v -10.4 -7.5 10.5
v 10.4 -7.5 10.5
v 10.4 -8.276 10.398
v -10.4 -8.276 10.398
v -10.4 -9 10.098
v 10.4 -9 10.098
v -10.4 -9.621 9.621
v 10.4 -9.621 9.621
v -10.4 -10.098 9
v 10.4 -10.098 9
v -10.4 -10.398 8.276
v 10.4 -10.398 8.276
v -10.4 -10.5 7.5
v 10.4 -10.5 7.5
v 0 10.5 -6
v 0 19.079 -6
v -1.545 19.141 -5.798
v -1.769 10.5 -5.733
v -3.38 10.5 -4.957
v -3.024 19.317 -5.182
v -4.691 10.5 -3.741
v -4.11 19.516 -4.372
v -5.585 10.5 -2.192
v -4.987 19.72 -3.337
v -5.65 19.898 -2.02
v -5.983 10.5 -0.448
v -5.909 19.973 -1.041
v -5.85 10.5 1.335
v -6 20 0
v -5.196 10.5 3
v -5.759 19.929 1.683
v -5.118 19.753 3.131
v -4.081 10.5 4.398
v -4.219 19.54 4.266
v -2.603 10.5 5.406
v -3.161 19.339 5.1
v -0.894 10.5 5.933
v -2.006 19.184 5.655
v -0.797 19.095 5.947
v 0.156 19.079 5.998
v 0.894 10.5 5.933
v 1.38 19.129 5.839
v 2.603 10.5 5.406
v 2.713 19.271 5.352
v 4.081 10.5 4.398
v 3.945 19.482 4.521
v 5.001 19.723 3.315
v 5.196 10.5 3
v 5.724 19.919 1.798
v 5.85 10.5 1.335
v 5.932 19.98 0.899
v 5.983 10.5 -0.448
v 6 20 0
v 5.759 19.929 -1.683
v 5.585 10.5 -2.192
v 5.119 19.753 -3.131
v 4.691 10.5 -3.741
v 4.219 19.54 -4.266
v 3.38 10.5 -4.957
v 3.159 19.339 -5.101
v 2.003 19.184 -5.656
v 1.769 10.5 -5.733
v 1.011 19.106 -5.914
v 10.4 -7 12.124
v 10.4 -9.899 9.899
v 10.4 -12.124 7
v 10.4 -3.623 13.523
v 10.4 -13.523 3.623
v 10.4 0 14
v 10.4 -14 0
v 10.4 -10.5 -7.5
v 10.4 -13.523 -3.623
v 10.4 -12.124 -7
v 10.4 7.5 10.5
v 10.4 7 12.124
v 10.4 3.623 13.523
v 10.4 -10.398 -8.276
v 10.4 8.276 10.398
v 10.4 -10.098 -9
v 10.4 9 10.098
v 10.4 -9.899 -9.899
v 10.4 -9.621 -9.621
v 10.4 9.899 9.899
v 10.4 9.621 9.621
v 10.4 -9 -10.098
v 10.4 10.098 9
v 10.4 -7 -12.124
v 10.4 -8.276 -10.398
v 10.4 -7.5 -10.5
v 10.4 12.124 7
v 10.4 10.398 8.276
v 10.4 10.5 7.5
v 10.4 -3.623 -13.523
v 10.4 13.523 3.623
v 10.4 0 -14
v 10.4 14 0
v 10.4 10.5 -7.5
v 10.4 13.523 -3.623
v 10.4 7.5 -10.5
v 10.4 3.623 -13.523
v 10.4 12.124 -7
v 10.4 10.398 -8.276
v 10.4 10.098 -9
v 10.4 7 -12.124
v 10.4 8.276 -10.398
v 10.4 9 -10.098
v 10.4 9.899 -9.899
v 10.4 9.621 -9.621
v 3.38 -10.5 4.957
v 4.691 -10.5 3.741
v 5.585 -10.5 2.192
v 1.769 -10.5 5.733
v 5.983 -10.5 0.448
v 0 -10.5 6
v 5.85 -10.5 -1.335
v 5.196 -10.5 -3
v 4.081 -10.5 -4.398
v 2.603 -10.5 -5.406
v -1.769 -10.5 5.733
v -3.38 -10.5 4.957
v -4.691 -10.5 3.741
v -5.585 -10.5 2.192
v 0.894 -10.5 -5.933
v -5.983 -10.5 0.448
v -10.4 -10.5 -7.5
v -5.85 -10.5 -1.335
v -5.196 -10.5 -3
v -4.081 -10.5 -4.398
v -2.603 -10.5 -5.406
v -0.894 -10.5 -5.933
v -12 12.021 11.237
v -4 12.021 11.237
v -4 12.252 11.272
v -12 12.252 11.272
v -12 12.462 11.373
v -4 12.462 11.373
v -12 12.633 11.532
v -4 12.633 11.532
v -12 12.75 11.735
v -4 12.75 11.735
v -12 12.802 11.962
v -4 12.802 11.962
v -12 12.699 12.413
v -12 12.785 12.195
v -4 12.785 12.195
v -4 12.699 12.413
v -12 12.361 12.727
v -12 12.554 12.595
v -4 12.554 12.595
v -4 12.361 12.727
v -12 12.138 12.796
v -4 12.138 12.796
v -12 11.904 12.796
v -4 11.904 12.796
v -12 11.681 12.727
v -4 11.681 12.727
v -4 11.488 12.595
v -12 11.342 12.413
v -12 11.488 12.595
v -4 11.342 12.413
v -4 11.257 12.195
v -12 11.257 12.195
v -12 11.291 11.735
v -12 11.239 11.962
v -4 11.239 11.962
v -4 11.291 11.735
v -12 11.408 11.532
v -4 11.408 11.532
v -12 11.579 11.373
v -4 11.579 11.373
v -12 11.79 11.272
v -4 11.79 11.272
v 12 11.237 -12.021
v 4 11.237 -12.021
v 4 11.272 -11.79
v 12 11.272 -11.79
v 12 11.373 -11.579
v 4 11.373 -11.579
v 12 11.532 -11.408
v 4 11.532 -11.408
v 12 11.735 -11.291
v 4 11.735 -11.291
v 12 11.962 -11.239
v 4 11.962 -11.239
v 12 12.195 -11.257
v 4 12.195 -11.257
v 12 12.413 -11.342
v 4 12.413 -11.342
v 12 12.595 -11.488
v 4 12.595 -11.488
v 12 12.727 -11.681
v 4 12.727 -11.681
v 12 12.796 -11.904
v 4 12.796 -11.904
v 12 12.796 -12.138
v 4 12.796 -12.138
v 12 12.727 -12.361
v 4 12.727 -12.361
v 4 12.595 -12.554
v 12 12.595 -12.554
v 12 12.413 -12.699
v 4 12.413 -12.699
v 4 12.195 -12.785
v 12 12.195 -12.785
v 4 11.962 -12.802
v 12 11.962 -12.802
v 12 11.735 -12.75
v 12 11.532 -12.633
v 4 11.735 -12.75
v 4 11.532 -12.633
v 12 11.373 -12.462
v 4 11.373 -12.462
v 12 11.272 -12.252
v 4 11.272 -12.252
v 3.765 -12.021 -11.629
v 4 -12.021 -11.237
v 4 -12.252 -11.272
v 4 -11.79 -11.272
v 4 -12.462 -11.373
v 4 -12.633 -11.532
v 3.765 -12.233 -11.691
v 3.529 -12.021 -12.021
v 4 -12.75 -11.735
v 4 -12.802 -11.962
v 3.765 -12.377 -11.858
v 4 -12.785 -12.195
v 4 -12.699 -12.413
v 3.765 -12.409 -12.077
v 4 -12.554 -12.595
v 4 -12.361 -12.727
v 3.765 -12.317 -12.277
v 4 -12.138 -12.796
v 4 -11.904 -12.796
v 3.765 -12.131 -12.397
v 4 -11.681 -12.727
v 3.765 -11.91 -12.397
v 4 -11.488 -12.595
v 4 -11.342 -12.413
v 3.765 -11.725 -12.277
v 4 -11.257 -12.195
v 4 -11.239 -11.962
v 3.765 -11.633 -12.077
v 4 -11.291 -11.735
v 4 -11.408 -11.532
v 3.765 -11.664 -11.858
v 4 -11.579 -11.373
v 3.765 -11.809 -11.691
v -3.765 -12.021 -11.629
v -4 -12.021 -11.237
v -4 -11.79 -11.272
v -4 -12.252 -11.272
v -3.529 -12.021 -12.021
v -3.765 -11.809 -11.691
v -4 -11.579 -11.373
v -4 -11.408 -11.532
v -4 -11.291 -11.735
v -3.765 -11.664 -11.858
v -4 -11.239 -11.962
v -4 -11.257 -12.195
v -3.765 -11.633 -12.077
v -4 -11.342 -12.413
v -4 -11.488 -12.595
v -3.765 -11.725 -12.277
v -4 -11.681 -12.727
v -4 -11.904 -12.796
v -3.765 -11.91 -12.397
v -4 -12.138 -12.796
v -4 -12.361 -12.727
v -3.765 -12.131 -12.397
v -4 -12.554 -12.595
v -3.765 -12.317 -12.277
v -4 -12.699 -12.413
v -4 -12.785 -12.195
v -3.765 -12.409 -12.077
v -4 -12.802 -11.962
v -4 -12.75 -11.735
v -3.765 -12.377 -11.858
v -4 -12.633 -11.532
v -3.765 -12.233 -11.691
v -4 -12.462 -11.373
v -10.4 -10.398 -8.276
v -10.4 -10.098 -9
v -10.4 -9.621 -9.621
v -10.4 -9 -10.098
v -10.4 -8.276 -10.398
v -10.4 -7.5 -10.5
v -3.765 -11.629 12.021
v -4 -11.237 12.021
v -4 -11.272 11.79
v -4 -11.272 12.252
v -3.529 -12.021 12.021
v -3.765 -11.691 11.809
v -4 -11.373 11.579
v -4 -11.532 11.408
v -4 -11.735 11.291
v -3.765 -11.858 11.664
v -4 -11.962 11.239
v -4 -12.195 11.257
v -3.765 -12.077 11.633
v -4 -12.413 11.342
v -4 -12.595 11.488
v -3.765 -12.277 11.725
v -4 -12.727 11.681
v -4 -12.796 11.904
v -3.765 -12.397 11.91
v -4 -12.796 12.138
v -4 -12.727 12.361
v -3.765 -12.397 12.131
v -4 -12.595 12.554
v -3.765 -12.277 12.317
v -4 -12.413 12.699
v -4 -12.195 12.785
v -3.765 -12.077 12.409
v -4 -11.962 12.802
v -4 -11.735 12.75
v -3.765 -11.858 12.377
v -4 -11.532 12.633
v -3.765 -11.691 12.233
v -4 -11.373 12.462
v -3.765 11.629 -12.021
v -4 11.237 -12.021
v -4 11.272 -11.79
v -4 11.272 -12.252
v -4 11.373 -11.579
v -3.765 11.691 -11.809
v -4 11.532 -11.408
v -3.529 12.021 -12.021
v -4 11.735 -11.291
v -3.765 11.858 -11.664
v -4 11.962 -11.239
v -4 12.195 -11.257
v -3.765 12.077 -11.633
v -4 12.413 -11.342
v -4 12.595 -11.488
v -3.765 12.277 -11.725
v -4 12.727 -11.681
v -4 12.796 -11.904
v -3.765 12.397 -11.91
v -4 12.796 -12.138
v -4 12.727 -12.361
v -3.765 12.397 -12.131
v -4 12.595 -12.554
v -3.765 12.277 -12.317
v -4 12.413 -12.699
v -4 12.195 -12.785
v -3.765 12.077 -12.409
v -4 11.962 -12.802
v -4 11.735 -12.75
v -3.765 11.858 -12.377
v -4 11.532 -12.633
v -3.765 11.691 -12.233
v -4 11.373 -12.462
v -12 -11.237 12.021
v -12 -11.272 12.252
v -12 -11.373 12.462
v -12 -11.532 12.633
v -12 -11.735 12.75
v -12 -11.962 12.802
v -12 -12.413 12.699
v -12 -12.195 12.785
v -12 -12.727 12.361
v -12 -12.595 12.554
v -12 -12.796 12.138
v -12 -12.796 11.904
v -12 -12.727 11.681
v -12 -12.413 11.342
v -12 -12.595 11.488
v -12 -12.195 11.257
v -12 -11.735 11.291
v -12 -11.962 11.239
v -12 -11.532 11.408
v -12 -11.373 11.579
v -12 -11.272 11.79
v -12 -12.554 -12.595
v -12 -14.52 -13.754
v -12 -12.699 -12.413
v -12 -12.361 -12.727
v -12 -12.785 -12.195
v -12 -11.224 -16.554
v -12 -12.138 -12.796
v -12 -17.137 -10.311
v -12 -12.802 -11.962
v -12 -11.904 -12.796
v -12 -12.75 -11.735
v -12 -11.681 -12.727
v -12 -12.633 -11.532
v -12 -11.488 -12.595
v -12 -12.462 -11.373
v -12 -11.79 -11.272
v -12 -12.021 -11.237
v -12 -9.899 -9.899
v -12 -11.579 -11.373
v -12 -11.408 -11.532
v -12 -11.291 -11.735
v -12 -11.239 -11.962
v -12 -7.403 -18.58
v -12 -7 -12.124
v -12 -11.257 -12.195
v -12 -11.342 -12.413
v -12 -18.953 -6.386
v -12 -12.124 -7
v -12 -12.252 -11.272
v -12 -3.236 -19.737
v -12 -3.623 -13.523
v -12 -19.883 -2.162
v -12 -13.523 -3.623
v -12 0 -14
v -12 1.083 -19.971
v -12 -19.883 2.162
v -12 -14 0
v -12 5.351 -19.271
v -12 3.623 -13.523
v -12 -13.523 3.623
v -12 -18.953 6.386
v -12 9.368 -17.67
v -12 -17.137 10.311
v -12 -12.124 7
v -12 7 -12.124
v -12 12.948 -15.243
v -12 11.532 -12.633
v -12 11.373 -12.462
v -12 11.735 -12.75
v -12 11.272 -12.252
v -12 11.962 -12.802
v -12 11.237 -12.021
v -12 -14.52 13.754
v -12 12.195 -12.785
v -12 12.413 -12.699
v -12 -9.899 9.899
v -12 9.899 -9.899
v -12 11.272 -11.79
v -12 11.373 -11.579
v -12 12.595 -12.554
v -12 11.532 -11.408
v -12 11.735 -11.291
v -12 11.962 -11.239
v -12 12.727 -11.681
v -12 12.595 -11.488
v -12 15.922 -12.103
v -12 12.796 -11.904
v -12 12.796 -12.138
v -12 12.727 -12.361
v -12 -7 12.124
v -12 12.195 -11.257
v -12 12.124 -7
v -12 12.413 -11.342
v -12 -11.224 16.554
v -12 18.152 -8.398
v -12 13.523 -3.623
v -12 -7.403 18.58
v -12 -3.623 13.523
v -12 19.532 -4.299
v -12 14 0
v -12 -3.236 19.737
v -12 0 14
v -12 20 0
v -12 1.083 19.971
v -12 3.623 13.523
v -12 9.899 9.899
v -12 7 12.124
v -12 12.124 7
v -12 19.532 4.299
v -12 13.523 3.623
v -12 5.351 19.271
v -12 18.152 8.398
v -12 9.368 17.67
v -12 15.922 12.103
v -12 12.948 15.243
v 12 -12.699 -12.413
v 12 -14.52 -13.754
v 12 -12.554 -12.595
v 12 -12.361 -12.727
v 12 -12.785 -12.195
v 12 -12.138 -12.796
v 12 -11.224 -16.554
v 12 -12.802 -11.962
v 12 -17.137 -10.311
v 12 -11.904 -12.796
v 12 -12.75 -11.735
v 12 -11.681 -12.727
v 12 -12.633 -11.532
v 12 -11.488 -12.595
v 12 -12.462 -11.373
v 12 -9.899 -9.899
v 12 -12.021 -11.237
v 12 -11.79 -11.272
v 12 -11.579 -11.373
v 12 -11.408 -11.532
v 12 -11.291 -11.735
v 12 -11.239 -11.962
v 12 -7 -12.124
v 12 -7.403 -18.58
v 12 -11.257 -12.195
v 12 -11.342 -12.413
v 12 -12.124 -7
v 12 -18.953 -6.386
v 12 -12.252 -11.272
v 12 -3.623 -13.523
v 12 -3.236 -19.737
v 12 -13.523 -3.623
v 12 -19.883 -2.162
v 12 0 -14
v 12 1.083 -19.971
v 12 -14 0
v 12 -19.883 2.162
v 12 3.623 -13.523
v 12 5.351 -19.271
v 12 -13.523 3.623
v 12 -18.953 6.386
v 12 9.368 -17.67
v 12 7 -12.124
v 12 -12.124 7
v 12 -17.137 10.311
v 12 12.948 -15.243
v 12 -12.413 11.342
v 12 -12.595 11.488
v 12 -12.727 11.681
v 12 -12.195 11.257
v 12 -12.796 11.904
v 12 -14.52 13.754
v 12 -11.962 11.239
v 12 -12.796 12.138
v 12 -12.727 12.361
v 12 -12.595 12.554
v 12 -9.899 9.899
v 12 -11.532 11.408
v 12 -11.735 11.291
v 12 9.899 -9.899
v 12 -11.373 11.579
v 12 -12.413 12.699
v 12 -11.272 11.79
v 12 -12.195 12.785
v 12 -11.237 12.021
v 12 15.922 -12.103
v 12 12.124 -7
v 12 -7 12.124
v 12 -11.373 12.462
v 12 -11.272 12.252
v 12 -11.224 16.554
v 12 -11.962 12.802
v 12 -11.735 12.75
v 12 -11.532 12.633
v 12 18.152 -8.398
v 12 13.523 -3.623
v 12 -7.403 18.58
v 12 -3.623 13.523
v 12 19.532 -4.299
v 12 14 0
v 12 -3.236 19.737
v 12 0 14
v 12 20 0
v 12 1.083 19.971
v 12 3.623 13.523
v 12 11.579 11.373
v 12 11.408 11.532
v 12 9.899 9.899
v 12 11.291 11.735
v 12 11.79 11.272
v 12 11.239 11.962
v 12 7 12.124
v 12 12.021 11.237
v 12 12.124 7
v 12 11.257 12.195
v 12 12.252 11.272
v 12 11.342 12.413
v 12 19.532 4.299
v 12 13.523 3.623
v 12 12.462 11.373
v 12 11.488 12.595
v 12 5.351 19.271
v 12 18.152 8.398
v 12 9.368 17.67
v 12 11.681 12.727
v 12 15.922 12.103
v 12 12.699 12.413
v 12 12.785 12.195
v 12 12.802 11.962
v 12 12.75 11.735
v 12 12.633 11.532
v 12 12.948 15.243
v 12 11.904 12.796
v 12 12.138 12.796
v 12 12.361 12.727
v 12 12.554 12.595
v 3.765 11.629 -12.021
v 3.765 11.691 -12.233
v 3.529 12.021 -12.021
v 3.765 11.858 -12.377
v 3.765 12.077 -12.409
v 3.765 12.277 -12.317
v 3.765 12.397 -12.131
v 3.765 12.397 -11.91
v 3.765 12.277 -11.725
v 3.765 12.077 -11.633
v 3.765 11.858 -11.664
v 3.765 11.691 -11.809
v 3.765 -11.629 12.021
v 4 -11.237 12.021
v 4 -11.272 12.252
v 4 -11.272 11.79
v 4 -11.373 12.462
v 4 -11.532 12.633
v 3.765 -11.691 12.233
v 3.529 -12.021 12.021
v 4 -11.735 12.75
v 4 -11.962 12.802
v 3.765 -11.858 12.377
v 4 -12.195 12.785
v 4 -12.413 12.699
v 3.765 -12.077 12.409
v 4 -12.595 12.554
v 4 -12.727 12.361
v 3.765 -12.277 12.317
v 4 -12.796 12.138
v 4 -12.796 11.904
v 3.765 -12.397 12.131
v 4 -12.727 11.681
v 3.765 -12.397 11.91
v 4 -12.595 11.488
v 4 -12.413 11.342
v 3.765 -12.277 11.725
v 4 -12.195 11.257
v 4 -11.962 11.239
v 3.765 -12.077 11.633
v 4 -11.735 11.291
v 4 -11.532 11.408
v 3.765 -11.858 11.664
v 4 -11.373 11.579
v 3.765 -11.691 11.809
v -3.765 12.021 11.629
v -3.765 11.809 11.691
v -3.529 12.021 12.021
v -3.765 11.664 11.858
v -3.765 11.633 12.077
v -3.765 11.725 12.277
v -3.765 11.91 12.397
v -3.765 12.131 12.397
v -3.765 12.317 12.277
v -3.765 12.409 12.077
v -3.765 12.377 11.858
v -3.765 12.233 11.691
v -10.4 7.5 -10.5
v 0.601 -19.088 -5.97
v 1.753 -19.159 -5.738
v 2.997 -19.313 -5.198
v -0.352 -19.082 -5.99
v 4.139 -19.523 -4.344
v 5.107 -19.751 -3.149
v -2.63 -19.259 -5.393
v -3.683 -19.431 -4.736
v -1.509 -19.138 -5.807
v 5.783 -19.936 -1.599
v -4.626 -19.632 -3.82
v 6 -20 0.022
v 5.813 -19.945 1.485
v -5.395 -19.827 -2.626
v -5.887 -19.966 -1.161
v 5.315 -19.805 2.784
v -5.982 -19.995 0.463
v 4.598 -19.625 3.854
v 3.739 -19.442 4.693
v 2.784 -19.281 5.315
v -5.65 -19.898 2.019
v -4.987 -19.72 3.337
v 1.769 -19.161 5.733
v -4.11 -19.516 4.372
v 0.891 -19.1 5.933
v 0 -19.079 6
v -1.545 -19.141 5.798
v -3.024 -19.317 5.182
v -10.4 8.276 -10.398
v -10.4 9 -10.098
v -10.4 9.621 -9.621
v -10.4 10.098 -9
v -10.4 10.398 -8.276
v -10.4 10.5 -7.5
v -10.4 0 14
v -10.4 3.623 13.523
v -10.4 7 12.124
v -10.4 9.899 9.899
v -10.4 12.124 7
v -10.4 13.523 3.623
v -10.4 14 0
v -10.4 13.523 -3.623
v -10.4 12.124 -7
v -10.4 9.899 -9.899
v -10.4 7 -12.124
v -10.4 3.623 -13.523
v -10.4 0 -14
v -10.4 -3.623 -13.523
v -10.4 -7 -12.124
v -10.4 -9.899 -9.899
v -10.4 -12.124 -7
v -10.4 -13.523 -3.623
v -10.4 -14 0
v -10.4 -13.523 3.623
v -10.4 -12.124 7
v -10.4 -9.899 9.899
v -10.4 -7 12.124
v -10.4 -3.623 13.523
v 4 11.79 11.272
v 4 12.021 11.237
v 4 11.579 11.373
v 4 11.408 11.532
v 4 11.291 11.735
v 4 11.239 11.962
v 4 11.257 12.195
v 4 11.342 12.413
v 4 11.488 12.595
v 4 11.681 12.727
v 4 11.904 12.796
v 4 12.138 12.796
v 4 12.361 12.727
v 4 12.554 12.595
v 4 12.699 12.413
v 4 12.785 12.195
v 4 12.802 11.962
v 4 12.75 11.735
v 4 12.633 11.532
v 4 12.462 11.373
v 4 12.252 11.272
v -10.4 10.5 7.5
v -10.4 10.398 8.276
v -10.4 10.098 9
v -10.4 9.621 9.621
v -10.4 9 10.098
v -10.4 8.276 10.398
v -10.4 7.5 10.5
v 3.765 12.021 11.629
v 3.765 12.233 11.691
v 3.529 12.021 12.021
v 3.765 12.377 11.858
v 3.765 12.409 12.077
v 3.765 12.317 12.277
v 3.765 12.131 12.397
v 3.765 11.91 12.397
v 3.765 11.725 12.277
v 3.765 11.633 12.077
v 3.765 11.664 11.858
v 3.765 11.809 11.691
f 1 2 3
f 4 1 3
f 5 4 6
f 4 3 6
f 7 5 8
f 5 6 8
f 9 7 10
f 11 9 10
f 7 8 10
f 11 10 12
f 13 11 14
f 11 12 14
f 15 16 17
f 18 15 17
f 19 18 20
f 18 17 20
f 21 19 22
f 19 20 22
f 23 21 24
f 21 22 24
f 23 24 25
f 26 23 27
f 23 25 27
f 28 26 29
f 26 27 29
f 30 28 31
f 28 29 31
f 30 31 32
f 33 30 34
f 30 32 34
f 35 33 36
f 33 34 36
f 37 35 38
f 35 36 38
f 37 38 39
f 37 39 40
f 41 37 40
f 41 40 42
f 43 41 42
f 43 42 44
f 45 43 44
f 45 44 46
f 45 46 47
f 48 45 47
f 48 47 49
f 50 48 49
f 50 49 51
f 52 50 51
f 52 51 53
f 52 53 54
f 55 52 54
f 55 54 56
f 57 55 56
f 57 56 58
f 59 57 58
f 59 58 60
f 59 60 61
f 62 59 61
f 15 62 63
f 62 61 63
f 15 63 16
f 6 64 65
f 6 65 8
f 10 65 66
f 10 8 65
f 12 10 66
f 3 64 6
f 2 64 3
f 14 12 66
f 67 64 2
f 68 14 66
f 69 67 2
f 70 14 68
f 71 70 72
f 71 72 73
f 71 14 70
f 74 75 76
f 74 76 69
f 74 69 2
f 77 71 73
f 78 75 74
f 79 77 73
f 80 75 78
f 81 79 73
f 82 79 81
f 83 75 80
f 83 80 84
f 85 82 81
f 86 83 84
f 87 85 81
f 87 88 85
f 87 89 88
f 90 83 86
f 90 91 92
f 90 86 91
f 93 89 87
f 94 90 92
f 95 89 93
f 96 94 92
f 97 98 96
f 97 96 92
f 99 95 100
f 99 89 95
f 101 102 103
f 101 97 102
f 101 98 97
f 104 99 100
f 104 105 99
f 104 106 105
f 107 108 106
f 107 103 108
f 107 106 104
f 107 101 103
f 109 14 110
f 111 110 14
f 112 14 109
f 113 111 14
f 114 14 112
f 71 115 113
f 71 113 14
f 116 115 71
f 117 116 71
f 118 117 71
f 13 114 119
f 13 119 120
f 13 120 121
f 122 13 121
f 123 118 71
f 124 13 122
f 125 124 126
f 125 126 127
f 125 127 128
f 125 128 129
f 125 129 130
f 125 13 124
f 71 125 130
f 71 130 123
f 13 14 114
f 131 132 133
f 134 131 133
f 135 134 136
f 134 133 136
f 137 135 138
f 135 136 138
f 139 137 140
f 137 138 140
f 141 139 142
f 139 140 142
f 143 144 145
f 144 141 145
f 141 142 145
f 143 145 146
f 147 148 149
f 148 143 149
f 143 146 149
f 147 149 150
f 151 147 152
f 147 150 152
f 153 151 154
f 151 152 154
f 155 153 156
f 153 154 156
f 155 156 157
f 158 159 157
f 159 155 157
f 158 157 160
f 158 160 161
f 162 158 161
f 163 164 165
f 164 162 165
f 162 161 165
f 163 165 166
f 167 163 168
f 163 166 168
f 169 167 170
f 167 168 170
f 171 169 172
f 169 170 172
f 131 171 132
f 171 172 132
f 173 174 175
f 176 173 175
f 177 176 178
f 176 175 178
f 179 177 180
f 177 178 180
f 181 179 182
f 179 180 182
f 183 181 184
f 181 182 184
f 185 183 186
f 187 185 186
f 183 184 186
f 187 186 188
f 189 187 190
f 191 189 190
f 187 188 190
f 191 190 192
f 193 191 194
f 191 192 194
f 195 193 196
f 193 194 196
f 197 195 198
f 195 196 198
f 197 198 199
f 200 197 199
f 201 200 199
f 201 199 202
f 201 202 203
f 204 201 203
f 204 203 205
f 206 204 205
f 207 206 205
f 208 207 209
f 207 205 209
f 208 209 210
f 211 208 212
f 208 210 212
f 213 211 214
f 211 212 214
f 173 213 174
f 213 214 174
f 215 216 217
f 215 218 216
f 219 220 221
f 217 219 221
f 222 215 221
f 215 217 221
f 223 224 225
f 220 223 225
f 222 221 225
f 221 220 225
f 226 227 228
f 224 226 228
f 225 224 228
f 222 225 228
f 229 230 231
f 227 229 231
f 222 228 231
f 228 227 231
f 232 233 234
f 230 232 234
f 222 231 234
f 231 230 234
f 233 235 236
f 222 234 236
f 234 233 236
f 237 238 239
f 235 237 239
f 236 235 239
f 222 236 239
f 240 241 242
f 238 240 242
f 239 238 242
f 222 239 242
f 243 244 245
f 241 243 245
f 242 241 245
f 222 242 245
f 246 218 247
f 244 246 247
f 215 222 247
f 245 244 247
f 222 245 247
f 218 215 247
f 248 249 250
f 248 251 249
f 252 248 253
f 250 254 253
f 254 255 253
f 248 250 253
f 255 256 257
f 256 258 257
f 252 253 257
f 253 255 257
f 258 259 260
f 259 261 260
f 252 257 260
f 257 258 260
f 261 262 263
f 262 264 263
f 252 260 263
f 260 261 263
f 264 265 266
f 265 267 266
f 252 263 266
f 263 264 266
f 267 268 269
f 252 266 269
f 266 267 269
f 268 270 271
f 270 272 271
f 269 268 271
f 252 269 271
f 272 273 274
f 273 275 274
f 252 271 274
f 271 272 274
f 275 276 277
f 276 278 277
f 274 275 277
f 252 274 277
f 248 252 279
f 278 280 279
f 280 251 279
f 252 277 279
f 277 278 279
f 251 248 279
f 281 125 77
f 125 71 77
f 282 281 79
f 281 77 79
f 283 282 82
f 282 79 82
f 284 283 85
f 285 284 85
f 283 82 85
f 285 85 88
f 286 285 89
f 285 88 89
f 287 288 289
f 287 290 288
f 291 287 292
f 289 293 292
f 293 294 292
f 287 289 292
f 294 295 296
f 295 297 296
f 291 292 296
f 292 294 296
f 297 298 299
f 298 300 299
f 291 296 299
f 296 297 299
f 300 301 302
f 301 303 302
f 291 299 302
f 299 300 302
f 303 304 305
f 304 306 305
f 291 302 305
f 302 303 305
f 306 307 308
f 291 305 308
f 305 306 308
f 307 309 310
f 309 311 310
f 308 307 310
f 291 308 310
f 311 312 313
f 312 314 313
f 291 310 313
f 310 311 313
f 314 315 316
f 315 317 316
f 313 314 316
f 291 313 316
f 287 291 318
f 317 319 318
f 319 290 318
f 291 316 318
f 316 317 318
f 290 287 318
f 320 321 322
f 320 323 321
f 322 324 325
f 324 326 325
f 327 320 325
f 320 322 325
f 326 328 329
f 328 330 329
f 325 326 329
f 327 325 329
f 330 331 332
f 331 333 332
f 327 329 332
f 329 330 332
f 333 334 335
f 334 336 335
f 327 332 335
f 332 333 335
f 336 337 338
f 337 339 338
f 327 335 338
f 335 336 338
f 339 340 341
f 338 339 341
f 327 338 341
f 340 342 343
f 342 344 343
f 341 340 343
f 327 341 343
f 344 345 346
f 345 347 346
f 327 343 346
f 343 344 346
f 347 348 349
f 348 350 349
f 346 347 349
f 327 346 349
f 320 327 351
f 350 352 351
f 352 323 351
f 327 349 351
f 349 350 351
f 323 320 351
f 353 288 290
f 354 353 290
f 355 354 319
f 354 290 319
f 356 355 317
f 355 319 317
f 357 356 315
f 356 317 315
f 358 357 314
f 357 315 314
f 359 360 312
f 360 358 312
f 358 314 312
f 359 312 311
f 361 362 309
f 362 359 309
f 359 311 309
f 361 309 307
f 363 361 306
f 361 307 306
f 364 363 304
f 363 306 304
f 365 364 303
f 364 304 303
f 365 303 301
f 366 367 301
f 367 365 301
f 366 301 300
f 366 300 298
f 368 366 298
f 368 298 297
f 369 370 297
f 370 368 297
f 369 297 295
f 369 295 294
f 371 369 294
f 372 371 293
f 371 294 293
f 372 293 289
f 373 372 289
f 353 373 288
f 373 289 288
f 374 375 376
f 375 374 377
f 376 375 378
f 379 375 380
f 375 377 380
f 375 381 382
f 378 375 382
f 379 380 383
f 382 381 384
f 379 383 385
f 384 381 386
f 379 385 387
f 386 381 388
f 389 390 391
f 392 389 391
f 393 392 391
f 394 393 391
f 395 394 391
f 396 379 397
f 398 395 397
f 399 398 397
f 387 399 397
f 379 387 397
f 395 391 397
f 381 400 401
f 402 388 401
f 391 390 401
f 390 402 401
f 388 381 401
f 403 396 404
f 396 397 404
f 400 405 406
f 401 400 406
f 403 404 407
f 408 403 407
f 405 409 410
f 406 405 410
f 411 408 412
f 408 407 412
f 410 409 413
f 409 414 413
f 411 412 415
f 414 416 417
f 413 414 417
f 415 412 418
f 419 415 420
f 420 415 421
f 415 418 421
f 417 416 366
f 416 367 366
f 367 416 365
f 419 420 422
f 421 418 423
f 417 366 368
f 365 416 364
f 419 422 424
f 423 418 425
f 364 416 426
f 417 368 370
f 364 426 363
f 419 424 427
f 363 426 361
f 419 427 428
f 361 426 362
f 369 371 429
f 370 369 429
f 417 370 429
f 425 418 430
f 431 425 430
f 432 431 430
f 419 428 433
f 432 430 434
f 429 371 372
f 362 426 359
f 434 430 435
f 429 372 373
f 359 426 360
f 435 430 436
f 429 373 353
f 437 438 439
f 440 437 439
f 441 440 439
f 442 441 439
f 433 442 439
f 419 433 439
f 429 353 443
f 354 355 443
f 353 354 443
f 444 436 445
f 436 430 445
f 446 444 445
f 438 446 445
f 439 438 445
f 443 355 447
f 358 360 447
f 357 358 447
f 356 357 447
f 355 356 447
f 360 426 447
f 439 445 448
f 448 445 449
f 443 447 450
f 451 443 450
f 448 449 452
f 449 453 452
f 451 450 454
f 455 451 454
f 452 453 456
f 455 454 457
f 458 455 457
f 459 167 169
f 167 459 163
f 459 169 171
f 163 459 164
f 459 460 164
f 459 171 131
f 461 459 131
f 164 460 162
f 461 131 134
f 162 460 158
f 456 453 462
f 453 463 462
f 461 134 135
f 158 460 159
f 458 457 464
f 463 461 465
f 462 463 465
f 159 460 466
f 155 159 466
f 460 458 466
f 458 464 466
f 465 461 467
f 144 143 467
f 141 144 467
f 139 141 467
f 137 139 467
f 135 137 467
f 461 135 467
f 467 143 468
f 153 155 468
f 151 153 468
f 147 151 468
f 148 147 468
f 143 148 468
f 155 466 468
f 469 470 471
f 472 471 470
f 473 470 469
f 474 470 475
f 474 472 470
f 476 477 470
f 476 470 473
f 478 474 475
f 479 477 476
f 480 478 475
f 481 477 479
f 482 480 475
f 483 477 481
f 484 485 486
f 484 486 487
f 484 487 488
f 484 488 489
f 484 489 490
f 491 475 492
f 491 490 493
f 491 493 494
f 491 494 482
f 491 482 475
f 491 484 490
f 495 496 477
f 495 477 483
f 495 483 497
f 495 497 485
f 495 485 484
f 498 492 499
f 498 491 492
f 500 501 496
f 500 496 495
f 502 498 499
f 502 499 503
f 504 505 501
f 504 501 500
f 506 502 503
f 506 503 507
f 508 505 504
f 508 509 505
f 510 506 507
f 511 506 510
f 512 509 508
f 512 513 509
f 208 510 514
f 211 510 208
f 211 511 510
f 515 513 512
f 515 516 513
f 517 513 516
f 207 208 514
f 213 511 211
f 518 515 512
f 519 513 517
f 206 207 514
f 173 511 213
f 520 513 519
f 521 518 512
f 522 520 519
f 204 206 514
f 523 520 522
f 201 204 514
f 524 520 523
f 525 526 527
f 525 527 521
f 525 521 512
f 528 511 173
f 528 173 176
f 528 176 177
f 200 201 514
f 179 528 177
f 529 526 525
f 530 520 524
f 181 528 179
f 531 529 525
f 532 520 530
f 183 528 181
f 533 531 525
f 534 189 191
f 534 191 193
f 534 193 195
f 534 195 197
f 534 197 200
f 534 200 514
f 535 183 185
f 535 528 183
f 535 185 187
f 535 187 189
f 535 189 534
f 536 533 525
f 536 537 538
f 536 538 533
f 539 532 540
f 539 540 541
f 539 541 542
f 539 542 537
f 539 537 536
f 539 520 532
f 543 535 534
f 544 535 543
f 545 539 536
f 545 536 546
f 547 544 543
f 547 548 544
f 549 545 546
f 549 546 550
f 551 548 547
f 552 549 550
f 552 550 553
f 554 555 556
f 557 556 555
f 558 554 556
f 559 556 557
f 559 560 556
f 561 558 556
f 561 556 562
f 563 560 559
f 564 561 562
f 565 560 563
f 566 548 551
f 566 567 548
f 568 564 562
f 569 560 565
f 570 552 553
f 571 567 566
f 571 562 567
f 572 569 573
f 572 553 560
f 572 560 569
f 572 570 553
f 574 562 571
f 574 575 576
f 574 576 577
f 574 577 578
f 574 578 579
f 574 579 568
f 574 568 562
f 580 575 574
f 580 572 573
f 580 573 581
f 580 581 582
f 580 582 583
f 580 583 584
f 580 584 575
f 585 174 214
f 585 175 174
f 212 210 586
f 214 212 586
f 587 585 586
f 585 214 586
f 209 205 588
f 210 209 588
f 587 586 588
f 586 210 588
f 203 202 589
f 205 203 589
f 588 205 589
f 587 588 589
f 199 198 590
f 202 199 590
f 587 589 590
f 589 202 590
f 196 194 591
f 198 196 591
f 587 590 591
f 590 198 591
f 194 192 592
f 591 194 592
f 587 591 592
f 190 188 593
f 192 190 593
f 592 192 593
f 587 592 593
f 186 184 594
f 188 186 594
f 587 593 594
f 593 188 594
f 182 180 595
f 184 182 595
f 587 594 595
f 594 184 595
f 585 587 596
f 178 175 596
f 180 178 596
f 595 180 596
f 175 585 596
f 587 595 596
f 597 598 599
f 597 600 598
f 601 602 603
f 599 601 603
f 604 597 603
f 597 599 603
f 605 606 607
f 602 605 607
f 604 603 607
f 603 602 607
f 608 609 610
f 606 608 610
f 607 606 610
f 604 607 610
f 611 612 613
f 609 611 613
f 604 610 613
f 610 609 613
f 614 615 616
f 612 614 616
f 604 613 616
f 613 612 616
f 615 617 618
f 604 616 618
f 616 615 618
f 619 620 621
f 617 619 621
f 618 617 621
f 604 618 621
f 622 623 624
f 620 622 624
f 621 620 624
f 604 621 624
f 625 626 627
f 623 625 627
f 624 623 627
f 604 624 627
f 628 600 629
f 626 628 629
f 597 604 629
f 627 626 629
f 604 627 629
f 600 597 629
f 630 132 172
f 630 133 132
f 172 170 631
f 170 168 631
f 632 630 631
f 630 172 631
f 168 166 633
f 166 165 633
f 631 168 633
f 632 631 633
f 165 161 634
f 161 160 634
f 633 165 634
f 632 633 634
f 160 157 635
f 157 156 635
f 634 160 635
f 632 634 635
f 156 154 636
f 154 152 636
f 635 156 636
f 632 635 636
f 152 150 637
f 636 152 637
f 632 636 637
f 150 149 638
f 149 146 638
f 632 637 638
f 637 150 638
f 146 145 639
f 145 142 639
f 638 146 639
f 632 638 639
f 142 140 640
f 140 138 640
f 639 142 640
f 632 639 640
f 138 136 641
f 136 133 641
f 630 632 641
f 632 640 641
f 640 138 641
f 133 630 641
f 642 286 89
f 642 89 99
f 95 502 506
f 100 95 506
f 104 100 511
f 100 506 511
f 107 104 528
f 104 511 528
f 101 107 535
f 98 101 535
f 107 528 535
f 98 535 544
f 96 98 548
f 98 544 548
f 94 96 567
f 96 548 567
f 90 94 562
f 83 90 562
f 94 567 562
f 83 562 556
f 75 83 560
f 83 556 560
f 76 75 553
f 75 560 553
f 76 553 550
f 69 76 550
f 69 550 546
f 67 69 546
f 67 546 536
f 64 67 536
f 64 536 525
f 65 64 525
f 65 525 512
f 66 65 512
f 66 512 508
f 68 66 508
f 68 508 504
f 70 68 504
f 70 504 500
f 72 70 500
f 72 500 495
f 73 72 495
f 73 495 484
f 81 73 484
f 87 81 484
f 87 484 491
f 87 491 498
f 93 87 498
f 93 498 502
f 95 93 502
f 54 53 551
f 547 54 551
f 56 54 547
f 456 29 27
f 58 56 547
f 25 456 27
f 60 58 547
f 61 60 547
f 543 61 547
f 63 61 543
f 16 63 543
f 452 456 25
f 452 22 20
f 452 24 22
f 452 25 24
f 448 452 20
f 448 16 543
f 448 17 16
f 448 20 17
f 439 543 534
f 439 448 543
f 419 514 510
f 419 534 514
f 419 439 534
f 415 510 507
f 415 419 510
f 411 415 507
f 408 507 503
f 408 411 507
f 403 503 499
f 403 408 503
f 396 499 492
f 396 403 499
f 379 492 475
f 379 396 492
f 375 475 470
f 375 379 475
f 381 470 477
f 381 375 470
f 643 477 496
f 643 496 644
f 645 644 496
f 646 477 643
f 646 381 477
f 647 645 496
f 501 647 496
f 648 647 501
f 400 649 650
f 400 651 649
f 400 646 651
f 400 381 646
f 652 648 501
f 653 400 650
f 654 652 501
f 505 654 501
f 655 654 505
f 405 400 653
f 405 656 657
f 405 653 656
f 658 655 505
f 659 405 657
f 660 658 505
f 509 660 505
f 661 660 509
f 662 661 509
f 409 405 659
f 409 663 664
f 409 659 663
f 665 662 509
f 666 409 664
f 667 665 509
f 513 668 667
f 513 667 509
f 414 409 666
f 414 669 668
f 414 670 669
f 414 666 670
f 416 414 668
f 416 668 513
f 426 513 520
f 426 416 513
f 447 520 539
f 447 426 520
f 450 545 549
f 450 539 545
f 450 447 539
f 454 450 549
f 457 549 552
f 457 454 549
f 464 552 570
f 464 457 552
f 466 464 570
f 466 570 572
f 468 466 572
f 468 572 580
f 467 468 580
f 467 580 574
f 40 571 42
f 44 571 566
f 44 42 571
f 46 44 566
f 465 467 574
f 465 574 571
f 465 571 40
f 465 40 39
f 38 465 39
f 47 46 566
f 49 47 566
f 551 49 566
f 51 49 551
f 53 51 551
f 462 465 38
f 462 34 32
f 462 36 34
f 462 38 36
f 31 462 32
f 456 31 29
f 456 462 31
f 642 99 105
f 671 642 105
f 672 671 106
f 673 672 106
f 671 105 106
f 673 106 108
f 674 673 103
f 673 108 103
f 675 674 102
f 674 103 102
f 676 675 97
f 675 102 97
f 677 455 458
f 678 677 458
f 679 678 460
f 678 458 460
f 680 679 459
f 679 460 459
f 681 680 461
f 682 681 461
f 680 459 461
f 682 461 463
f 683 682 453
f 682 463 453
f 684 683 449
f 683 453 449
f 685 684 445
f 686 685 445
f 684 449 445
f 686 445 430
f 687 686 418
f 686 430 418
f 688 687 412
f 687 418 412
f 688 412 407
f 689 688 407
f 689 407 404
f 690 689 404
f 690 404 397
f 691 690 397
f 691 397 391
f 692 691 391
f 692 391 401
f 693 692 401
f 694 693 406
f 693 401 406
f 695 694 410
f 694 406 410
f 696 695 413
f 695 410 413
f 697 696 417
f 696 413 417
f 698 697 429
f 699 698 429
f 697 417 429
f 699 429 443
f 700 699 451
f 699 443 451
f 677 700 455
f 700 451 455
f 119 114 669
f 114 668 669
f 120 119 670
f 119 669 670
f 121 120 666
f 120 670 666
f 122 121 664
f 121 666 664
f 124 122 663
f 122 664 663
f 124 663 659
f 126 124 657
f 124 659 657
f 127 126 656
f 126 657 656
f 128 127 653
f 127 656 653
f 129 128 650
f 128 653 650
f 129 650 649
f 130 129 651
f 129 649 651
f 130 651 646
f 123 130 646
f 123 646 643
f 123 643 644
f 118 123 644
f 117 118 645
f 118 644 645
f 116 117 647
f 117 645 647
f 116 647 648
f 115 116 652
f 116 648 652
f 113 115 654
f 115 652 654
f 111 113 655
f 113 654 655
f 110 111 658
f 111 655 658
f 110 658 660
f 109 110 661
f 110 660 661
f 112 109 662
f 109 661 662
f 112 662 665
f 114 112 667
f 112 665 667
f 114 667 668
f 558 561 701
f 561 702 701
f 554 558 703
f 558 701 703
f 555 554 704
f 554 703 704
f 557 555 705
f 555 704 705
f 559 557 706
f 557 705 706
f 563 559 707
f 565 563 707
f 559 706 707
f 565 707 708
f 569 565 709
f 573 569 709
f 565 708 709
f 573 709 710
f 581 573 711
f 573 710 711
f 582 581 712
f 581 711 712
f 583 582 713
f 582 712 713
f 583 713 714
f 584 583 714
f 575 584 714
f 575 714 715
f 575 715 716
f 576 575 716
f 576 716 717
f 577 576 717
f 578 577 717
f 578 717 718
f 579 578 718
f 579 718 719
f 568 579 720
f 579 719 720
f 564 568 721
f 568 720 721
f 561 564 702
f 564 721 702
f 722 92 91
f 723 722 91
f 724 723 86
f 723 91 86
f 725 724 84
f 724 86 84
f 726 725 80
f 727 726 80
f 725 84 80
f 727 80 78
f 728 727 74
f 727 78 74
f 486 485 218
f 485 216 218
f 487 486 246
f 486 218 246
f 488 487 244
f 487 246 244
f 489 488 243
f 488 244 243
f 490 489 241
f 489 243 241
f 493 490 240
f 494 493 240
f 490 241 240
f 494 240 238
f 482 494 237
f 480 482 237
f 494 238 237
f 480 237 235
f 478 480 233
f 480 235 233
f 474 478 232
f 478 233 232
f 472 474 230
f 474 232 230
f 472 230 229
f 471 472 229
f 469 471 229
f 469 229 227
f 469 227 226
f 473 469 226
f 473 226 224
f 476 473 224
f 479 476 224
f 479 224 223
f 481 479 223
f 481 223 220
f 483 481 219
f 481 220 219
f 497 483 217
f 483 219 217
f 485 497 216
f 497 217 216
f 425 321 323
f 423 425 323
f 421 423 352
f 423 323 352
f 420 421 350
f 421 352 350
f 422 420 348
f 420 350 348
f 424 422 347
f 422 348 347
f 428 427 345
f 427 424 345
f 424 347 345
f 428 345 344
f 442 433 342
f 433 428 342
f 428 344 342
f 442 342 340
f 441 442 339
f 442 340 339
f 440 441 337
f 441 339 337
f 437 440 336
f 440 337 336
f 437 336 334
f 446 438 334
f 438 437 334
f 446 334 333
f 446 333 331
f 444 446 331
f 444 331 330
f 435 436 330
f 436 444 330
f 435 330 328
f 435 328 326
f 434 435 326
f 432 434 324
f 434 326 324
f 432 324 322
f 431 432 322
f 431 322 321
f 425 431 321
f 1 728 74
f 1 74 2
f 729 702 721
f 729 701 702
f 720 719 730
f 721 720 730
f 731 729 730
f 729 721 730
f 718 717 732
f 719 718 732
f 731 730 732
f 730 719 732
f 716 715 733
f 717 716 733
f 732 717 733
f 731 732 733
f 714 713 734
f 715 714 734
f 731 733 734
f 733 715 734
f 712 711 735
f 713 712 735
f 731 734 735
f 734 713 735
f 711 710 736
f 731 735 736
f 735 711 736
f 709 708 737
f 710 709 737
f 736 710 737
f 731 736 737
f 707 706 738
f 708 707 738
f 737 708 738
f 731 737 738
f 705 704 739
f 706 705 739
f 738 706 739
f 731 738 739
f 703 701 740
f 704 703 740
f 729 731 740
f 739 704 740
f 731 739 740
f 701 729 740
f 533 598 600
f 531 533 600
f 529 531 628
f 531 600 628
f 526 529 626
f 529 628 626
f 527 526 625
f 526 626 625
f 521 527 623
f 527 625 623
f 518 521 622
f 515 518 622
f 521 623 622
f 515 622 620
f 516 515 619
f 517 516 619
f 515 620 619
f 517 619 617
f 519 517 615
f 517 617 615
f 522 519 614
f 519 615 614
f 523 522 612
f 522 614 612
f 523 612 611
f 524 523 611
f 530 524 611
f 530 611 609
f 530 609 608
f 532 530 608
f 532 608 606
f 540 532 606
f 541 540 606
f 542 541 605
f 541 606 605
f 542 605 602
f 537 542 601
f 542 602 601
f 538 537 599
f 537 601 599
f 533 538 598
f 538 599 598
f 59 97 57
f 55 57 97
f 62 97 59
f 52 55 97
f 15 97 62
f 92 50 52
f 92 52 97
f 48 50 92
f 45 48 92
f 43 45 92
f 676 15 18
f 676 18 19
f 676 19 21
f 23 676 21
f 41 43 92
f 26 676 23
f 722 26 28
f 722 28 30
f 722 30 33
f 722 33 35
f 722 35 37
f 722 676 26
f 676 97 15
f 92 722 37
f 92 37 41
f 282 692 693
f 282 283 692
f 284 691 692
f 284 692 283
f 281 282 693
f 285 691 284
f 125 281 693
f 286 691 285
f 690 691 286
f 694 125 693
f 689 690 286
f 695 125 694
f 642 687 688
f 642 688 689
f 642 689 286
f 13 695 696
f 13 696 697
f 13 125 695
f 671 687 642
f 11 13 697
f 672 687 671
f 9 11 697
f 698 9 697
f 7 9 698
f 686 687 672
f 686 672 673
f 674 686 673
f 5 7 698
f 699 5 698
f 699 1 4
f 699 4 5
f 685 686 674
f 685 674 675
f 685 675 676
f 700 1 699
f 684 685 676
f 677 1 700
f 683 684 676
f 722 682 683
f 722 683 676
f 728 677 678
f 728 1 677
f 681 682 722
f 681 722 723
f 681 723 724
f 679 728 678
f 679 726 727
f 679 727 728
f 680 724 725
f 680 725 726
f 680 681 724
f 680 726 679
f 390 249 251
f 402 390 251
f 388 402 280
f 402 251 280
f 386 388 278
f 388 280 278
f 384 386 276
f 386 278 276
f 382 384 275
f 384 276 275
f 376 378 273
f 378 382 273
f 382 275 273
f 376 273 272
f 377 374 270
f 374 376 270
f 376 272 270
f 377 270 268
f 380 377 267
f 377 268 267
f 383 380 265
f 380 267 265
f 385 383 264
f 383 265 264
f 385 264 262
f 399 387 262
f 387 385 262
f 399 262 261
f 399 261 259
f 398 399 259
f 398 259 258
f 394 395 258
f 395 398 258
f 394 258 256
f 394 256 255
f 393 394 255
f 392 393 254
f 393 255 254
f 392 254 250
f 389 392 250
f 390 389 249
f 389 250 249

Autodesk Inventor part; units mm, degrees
ref_plane "YZ Plane" through (0, 0, 0) normal (1, 0, 0) x (0, 1, 0)
ref_plane "XZ Plane" through (0, 0, 0) normal (0, 1, 0) x (-1, 0, 0)
ref_plane "XY Plane" through (0, 0, 0) normal (0, 0, 1) x (1, 0, 0)
sketch "Sketch1" plane through (0, 0, 0) normal (0, 0, 1) x (1, 0, 0)
  line L0 (-29.3592, 0) -> (29.3592, 0) construction
  line L1 (0, 14.1975) -> (0, -14.1975) construction
  line L2 (-12, 0) -> (12, 0)
  line L3 (12, 0) -> (12, 20)
  line L4 (-12, 20) -> (-12, 0)
  line L5 (-12, 20) -> (-12, 20.8787) construction
  line L6 (12, 20) -> (-12, 20)
  line L7 (50.3592, 10.5) -> (29.3592, 10.5)
  line L8 (29.3592, 10.5) -> (29.3592, -10.5)
  line L9 (29.3592, -10.5) -> (50.3592, -10.5)
  line L10 (50.3592, -10.5) -> (50.3592, 10.5)
  line L11 (29.3592, 0) -> (50.3592, 0) construction
  line L12 (39.8592, 0) -> (39.8592, 3.5595) construction
  circle A0 centre (39.8592, 0) radius 20
  line L13 (33.8592, 10.5) -> (45.8592, 10.5) construction
  line L14 (45.8592, 10.5) -> (45.8592, 24.7953) construction
  line L15 (45.8592, 24.7953) -> (33.8592, 24.7953) construction
  line L16 (33.8592, 24.7953) -> (33.8592, 10.5) construction
  line L17 (33.8592, 18.5) -> (45.8592, 18.5) construction
  point P0 (0, 0)
  point P1 (0, 0)
  point P2 (39.8592, 10.5)
  dimension "d1" = 24
  dimension "d2" = 12
  dimension "d5" = 40
  dimension "d18" = 21
  dimension "d19" = 21
  dimension "d20" = 12
  dimension "d22" = 8
  dimension "d23" = 40
revolve "Revolution1" add sketch "Sketch1" angle 360 about axis through (-29.3592, 0, 0) along (1, 0, 0) contours L4 L6 L3 L2
sketch "Sketch3" plane through (-12, 0, 0) normal (-1, 0, 0) x (0, 0, 1)
  line L0 (-10.5, 10.5) -> (10.5, 10.5)
  line L1 (10.5, 10.5) -> (10.5, -10.5)
  line L2 (10.5, -10.5) -> (-10.5, -10.5)
  line L3 (-10.5, -10.5) -> (-10.5, 10.5)
  point P0 (0, 0)
  point P1 (0, 10.5)
  point P2 (-10.5, 0)
  dimension "d24" = 21
  dimension "d25" = 21
extrude "Extrusion1" cut sketch "Sketch3" against normal through all
fillet "Fillet1" radius 3 4 edges at (0, 10.5, -10.5) (0, -10.5, -10.5) (0, -10.5, 10.5) (0, 10.5, 10.5)
sketch "Sketch4" plane through (-12, 10.5, -7.5) normal (0, -1, 0) x (1, 0, 0)
  point P0 (12, 7.5)
  point P1 (12, 7.5)
hole "Hole2" at (0, 10.5, 0) direction (0, 1, 0) diameter 12 depth 10 tip angle 118
pattern_circular "Circular Pattern2" count 2 over 360 about axis through (0, 0, 0) along (1, 0, 0) of "Hole2"
sketch "Sketch5" plane through (-12, 0, 0) normal (-1, 0, 0) x (0, 0, 1)
  circle A0 centre (0, 0) radius 14
  dimension "d39" = 28
extrude "Extrusion2" cut sketch "Sketch5" against normal blind 1.6
sketch "Sketch6" plane through (12, 0, 0) normal (1, 0, 0) x (0, 0, -1)
  circle A0 centre (0, 0) radius 14 projected
extrude "Extrusion3" cut sketch "Sketch6" against normal blind 1.6
sketch "Sketch7" plane through (12, 0, 0) normal (1, 0, 0) x (0, 0, -1)
  line L0 (-29.6226, 0) -> (29.6226, 0) construction
  line L1 (0, 0) -> (-16.5524, 16.5524) construction
  circle A0 centre (0, 0) radius 17 construction
  point P0 (-12.0208, 12.0208)
  dimension "d45" = 34
  dimension "d44" = 45
hole "Hole3" at (12, 12.0208, 12.0208) direction (-1, 0, 0) diameter 1.567 depth 8 tip angle 118 thread size "M2x0.4" class "6H" standard "ISO Metric profile"
pattern_circular "Circular Pattern3" count 4 over 360 about axis through (0, 0, 0) along (1, 0, 0) of "Hole3"
mirror "Mirror1" about plane through (0, 0, 0) normal (1, 0, 0) of "Hole3", "Circular Pattern3"
equation "\"d2\" = 0.5 * d1"
properties part number "P03" material "PVC-U (Transp. / Durchsicht.)"
